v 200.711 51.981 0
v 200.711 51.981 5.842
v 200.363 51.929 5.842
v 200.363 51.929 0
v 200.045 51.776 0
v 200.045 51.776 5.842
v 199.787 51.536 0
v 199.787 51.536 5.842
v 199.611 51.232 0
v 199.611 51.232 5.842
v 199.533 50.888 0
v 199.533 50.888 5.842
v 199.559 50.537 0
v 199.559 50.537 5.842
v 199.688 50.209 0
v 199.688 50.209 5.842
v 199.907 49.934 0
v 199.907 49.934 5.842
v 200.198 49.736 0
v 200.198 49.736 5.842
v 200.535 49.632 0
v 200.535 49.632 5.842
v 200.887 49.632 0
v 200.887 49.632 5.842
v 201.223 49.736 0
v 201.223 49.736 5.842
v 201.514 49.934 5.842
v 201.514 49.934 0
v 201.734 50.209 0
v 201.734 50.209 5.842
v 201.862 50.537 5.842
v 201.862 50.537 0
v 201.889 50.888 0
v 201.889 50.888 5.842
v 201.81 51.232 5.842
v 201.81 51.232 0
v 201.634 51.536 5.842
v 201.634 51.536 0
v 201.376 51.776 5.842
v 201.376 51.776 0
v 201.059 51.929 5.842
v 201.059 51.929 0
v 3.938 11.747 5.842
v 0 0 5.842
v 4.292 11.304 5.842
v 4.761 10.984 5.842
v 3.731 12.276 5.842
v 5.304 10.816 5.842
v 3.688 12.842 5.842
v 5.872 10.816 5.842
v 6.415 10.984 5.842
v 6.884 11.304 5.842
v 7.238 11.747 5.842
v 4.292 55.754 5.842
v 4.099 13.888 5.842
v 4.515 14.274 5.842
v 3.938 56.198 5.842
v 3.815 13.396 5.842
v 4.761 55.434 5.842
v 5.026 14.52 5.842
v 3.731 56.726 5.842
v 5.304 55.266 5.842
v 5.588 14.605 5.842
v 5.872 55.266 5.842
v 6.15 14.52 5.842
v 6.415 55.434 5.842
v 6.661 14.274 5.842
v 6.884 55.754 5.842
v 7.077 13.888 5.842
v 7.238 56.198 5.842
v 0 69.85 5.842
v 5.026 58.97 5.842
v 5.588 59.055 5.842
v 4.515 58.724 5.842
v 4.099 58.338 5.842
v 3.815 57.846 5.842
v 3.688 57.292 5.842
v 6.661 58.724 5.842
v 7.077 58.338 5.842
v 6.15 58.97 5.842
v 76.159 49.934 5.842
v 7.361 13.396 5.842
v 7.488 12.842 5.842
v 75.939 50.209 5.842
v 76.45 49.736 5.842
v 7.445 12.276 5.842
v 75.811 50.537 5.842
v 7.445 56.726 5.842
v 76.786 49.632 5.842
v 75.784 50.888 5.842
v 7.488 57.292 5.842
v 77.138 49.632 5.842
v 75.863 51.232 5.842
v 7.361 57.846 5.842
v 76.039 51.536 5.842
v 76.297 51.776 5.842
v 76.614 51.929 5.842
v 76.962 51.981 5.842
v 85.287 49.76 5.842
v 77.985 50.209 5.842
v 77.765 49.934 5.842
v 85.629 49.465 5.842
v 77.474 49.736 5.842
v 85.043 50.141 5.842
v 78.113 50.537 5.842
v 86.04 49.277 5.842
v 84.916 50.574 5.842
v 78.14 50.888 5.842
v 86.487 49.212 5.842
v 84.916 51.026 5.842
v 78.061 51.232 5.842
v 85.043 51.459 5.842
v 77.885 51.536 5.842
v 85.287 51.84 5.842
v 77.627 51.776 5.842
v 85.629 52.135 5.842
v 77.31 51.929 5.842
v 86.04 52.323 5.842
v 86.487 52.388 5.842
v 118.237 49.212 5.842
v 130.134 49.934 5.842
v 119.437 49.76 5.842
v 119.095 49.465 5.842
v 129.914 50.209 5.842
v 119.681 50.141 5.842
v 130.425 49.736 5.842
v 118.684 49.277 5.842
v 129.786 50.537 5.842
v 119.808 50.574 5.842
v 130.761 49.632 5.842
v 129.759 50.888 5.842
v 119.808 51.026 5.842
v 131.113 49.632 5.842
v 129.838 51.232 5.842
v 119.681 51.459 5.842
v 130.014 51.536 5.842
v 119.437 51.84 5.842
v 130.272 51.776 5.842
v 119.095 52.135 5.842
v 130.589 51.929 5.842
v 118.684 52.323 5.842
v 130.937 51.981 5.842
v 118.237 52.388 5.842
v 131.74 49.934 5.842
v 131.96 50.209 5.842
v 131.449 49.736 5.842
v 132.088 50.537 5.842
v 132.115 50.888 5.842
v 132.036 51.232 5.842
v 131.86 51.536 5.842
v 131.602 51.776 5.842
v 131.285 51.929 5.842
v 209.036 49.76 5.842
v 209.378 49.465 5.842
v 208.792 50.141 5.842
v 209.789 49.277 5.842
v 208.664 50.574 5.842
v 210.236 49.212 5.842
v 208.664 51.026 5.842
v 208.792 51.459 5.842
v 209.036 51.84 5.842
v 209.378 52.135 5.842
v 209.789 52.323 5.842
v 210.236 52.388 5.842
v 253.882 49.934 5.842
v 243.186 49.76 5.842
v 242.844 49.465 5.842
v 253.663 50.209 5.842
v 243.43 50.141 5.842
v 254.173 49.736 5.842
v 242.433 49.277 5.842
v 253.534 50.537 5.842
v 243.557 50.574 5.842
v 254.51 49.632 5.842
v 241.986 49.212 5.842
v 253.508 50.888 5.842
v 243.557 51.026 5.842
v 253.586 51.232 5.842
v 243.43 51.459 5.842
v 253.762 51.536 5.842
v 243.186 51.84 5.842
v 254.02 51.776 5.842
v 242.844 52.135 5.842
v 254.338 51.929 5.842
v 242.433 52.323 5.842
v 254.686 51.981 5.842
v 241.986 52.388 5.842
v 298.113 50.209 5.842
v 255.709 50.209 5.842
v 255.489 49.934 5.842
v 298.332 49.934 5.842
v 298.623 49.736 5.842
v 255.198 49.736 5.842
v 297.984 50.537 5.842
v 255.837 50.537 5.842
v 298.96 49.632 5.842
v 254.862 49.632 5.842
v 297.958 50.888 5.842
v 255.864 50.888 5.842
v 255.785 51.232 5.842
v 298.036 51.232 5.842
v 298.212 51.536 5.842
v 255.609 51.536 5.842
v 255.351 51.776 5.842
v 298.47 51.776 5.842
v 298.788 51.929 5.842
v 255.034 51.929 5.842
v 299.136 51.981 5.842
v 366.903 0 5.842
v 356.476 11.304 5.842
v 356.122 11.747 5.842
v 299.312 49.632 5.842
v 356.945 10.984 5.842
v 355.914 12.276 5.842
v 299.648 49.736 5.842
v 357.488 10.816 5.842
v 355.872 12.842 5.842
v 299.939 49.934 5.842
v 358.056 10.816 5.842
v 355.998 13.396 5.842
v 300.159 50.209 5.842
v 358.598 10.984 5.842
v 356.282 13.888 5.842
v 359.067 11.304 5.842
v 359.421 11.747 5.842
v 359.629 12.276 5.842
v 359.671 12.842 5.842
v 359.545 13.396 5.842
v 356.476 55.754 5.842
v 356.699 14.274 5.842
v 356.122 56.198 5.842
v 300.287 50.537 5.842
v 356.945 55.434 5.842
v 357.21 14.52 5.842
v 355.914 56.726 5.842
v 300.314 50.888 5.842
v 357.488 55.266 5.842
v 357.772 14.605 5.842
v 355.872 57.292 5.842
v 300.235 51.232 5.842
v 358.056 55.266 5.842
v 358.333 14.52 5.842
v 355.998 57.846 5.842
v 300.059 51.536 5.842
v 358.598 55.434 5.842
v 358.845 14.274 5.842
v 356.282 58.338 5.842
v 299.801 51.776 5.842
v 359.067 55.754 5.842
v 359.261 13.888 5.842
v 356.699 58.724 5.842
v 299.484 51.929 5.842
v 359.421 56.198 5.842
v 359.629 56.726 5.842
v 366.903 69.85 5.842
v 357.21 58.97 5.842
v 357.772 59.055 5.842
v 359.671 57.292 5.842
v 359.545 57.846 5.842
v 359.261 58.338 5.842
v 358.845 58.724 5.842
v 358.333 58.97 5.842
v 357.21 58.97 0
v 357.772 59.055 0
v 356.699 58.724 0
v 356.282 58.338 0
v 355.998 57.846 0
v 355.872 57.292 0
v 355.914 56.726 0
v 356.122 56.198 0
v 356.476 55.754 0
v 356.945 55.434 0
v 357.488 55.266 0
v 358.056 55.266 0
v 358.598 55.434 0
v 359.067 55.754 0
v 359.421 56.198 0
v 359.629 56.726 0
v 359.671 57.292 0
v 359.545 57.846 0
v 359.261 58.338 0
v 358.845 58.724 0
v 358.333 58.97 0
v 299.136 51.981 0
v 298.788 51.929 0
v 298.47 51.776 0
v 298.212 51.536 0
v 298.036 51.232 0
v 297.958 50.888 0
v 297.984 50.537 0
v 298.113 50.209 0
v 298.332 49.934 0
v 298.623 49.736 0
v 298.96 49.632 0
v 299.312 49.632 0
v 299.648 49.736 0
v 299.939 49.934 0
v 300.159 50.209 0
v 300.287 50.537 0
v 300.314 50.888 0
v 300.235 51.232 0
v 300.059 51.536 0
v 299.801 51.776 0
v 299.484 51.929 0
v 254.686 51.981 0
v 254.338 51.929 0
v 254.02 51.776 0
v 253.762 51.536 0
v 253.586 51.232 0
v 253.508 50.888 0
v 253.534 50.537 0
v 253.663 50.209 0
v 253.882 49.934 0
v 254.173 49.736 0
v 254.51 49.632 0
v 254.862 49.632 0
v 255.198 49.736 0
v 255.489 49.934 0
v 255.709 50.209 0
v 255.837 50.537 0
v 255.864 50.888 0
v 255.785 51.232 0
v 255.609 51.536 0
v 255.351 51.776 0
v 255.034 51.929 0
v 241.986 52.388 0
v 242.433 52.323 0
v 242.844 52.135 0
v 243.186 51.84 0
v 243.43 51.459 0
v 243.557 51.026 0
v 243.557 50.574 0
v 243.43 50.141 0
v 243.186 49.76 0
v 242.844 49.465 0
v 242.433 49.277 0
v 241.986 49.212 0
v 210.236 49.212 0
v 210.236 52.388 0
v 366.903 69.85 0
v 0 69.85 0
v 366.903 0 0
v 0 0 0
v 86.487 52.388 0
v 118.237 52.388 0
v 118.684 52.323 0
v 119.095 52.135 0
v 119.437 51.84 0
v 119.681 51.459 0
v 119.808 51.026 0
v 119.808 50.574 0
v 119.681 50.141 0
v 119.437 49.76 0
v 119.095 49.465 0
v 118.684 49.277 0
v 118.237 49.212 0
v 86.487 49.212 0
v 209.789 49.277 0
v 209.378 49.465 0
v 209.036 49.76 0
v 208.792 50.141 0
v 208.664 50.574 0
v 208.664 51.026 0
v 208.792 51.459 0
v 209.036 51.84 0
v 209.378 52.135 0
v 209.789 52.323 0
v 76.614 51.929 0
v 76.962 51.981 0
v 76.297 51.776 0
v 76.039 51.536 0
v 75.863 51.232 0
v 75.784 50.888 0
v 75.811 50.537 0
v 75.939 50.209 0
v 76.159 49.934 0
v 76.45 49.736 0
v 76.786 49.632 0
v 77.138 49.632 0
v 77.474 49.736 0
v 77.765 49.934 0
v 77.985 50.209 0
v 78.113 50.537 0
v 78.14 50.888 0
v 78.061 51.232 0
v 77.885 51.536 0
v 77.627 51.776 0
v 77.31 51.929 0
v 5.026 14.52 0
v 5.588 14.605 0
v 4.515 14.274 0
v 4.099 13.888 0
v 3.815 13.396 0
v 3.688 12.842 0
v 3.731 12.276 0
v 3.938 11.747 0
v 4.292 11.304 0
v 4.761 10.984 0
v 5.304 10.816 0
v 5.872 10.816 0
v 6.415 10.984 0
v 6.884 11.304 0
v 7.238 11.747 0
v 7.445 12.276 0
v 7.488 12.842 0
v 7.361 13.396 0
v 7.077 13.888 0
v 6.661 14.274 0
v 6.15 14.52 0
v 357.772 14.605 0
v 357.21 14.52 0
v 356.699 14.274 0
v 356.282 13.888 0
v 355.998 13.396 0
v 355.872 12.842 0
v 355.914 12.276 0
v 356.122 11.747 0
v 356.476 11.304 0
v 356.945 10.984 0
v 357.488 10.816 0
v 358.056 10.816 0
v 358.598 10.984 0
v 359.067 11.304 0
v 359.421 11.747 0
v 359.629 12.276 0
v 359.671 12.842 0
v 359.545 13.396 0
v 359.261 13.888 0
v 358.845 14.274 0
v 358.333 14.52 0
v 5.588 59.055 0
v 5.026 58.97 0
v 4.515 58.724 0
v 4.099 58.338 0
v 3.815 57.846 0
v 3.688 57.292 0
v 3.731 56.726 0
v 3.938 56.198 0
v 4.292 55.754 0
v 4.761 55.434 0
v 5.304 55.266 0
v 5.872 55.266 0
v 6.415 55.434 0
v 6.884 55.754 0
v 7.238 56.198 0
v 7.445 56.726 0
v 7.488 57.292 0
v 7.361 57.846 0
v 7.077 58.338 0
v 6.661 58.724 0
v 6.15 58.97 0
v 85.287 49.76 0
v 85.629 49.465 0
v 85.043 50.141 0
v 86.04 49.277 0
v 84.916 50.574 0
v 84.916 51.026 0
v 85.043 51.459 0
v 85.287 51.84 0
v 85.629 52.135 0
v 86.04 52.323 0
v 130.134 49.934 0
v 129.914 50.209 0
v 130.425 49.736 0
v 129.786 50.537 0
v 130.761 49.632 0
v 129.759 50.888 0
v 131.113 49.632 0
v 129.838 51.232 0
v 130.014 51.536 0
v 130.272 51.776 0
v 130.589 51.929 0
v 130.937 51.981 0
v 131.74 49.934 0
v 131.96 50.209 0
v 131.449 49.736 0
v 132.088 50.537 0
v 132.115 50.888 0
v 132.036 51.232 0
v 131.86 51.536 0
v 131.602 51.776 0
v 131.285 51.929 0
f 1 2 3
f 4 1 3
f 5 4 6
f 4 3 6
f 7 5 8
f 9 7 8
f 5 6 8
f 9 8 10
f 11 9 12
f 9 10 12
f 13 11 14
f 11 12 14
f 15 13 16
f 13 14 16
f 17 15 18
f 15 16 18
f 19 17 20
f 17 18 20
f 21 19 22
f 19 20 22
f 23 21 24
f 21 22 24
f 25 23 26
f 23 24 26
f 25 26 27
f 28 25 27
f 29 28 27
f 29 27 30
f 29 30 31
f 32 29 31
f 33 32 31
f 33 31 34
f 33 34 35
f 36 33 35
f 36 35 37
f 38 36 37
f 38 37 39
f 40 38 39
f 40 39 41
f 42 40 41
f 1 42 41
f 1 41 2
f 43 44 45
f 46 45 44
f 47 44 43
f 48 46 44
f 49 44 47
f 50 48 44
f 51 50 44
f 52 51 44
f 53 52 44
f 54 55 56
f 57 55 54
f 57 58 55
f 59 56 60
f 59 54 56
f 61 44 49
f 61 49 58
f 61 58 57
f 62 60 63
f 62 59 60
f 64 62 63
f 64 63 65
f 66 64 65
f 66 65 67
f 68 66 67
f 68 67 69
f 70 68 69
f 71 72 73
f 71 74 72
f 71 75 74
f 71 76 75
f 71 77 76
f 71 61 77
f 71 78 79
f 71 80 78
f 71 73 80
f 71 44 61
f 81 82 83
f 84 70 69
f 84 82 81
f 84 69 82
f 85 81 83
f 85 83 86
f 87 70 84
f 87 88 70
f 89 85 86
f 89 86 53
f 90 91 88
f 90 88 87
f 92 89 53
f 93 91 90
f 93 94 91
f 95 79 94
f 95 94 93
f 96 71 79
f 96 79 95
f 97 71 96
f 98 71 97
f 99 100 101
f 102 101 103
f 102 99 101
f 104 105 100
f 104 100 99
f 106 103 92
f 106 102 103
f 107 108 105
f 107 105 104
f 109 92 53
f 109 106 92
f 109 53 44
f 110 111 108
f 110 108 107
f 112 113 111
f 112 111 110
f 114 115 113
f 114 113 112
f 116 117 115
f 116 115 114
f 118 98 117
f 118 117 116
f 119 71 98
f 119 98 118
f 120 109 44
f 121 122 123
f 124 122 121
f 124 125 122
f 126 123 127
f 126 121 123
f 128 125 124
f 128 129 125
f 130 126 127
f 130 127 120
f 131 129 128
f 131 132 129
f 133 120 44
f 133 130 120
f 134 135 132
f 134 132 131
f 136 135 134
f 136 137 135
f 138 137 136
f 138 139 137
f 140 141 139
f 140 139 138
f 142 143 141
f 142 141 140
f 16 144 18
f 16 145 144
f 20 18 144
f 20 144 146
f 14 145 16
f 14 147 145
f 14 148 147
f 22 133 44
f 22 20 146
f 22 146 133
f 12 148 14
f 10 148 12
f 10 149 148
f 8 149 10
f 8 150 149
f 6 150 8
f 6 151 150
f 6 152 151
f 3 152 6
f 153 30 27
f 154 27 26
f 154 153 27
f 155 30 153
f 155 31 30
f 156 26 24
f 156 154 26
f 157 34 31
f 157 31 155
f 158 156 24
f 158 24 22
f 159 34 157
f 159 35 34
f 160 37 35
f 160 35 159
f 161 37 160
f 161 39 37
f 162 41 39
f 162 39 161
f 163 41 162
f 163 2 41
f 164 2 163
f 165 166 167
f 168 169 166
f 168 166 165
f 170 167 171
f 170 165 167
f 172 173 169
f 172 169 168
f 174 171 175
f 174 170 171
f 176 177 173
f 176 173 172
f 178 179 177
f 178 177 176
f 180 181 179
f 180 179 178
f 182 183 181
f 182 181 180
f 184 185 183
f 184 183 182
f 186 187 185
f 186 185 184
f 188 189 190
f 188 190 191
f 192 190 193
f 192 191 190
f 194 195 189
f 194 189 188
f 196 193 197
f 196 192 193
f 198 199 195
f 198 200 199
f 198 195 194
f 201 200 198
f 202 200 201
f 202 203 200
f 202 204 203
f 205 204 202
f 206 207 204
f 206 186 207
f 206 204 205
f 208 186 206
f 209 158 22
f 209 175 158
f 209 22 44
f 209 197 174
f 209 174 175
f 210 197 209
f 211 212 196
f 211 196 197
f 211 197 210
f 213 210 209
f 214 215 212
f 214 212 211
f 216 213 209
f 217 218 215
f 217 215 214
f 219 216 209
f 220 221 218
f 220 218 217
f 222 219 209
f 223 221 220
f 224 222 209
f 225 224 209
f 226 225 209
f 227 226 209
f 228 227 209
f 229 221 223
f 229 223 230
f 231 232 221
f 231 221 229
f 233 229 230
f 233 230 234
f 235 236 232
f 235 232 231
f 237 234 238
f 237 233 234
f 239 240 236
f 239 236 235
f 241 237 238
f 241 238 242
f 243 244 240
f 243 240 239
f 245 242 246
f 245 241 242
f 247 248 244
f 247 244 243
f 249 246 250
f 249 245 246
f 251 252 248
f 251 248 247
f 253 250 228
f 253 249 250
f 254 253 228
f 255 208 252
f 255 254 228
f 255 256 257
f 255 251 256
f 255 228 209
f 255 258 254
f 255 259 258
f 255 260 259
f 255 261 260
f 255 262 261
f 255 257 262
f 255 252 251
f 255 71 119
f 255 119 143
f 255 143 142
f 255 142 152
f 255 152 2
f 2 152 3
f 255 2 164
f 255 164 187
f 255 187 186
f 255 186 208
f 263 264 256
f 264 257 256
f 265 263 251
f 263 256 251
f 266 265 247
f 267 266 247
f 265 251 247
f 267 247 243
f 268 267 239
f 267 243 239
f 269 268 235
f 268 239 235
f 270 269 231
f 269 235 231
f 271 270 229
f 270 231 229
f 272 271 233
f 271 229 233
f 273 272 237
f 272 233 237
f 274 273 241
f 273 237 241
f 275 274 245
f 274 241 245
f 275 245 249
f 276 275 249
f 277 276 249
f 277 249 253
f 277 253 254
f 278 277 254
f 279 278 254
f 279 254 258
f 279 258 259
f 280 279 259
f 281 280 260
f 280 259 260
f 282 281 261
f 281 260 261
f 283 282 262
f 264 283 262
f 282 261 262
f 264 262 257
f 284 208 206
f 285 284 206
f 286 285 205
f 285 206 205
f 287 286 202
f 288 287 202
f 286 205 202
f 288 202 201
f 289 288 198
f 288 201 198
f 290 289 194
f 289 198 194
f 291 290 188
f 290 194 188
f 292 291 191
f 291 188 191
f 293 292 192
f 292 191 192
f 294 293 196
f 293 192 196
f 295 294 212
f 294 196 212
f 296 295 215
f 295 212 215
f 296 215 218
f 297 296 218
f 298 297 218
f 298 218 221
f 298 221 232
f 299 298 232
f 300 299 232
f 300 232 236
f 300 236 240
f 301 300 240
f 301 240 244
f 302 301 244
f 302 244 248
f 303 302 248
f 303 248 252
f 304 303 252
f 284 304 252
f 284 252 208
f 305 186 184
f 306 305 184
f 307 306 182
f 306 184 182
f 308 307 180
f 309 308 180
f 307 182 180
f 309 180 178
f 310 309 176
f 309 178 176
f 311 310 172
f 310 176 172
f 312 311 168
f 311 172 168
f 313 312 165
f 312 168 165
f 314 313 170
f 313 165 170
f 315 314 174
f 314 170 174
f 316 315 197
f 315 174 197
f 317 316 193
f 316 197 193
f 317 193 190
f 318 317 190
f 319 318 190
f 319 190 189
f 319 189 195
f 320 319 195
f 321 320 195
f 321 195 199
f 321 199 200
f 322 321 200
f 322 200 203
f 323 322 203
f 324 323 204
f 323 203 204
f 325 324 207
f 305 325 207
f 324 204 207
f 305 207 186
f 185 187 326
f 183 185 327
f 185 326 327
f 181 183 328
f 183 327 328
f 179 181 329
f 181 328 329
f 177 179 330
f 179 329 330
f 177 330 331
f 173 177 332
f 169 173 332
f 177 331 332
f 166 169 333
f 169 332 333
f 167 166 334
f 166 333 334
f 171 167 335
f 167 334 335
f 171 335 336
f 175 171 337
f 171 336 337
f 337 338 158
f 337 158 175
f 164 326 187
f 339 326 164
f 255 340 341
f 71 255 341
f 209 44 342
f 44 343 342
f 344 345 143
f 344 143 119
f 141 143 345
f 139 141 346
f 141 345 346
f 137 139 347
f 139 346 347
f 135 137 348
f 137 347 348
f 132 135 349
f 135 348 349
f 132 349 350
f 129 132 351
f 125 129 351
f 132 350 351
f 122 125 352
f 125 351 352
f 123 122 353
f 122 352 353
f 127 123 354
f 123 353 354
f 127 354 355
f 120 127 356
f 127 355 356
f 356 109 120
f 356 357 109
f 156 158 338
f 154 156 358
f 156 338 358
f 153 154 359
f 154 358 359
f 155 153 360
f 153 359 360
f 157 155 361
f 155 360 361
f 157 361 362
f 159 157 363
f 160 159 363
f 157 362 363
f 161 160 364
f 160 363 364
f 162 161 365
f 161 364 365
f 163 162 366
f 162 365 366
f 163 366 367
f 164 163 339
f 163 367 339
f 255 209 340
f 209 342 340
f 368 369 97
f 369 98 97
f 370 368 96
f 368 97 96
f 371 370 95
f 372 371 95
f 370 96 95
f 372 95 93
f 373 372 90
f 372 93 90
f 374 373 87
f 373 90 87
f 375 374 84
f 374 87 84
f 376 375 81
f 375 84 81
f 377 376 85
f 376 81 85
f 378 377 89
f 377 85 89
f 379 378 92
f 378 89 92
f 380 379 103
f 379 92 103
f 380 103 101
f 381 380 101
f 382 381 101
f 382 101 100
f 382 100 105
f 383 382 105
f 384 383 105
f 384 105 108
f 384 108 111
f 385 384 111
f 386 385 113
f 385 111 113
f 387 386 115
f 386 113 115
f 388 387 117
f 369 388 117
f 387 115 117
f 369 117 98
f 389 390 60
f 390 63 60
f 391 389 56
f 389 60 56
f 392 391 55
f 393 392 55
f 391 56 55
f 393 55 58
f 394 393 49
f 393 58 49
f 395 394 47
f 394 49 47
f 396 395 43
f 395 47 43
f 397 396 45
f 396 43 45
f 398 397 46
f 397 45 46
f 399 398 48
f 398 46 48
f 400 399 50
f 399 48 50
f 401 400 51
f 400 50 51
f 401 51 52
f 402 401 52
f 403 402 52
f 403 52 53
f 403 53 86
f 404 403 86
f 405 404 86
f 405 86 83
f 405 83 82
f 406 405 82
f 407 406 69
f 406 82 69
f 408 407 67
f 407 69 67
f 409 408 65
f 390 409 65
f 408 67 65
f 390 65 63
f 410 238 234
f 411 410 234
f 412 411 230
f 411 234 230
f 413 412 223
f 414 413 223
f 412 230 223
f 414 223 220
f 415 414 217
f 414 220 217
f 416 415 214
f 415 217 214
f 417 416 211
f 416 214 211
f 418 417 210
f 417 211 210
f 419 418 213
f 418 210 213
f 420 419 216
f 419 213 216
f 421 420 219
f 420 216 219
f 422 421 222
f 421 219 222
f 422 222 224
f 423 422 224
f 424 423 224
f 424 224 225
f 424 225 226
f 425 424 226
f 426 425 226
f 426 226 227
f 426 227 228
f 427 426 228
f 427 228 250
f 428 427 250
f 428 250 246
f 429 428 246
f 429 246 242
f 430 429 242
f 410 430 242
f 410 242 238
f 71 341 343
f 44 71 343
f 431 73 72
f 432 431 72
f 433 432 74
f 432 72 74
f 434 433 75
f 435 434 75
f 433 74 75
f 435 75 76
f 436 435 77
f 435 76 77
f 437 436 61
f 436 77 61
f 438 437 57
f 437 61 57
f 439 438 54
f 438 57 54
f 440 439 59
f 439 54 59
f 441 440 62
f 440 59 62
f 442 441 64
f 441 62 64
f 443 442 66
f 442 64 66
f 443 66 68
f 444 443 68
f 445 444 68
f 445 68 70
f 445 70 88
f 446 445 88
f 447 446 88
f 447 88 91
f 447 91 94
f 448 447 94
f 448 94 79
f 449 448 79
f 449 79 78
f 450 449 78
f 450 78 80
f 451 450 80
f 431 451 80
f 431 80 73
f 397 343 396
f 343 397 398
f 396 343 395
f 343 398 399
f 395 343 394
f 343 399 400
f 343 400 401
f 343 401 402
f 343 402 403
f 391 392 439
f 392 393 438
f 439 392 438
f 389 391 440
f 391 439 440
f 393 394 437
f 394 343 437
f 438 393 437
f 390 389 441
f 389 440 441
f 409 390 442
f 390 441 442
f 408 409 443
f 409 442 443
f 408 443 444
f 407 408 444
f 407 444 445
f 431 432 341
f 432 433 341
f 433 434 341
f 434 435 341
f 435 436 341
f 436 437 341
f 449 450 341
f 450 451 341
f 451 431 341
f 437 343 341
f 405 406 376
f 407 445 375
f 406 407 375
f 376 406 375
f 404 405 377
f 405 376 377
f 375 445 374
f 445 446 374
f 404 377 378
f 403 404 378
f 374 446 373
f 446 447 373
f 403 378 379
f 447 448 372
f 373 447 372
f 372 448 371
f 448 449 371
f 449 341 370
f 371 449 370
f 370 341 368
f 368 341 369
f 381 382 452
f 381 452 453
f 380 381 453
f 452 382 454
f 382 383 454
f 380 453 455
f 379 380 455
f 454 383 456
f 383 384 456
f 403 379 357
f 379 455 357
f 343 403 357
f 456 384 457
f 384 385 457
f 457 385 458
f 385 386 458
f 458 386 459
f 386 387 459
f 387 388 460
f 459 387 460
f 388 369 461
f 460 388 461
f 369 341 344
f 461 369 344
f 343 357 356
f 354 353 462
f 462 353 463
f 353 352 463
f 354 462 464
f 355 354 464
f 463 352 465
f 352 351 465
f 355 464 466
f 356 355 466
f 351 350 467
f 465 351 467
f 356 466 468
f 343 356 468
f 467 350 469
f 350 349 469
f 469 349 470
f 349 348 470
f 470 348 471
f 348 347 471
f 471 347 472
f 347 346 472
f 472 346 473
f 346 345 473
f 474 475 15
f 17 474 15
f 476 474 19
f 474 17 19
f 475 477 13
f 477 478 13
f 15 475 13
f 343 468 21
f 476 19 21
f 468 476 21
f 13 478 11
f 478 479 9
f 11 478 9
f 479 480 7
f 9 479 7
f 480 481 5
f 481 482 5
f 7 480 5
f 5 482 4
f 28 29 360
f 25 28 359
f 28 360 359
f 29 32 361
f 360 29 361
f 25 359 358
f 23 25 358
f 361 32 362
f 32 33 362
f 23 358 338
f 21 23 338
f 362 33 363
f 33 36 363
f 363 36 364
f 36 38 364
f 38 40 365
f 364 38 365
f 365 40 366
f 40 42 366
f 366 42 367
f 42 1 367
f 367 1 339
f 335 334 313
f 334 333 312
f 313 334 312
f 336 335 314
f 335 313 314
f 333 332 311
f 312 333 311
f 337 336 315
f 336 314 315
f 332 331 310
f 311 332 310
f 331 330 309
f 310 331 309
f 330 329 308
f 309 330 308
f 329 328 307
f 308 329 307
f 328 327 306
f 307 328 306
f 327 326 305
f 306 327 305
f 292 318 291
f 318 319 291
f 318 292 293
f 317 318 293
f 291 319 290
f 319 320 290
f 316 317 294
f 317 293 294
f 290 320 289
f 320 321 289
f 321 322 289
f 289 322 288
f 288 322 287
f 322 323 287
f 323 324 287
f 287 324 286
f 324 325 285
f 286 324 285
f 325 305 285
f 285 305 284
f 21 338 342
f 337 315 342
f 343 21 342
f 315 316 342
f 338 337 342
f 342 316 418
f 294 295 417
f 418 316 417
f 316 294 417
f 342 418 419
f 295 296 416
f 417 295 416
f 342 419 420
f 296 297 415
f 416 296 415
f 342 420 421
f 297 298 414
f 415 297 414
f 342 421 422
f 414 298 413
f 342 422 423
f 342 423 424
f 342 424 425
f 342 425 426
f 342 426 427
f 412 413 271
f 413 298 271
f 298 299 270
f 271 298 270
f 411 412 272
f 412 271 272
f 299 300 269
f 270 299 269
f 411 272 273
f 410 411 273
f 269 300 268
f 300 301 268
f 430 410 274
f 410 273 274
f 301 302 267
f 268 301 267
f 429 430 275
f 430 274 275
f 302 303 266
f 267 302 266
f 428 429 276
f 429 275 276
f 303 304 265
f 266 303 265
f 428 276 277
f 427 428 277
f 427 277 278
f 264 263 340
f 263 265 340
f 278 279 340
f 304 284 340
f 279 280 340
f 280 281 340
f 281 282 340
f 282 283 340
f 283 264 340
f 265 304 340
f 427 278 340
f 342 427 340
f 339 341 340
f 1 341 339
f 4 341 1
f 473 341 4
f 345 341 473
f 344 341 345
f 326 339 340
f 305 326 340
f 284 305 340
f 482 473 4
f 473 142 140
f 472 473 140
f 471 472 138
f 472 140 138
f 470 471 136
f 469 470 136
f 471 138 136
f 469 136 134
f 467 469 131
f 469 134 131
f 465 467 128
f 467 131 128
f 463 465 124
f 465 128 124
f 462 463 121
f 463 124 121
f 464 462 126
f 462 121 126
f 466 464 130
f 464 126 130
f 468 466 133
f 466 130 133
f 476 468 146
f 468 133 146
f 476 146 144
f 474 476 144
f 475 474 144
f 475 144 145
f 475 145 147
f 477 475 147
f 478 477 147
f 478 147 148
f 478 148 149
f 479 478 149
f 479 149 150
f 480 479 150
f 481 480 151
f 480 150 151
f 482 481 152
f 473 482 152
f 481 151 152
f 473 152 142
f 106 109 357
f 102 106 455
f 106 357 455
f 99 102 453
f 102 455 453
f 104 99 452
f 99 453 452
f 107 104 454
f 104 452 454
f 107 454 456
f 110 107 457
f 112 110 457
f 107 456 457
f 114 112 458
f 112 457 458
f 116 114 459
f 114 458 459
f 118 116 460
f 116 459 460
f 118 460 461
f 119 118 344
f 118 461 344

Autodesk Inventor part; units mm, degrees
ref_plane "YZ Plane" through (0, 0, 0) normal (1, 0, 0) x (0, 1, 0)
ref_plane "XZ Plane" through (0, 0, 0) normal (0, 1, 0) x (-1, 0, 0)
sketch "Sketch1" plane through (0, 0, 0) normal (0, 0, 1) x (1, 0, 0)
  line L0 (0, 83.82) -> (0, -13.97) projected
  line L1 (-73.3806, 0) -> (440.2836, 0) projected
  line L2 (0, 0) -> (366.903, 0)
  line L3 (366.903, 0) -> (366.903, 69.85)
  line L4 (366.903, 69.85) -> (0, 69.85)
  line L5 (0, 69.85) -> (0, 0)
  line L6 (0, 34.925) -> (366.903, 34.925) construction
  line L7 (241.9858, 50.8) -> (210.2358, 50.8) construction
  line L8 (241.9858, 52.3875) -> (210.2358, 52.3875)
  line L9 (210.2358, 49.2125) -> (241.9858, 49.2125)
  arc A0 (241.9858, 49.2125) -> (241.9858, 52.3875) centre (241.9858, 50.8) ccw
  arc A1 (210.2358, 52.3875) -> (210.2358, 49.2125) centre (210.2358, 50.8) ccw
  line L10 (118.237, 50.8) -> (86.487, 50.8) construction
  line L11 (118.237, 52.3875) -> (86.487, 52.3875)
  line L12 (86.487, 49.2125) -> (118.237, 49.2125)
  arc A2 (118.237, 49.2125) -> (118.237, 52.3875) centre (118.237, 50.8) ccw
  arc A3 (86.487, 52.3875) -> (86.487, 49.2125) centre (86.487, 50.8) ccw
  line L13 (102.362, 50.8) -> (366.903, 50.8) construction
  point P0 (5.588, 12.7)
  point P1 (5.588, 57.15)
  point P2 (357.7717, 57.15)
  point P3 (357.7717, 12.7)
  point P4 (226.1108, 50.8)
  point P5 (226.1108, 50.8)
  point P6 (130.937, 50.8)
  point P7 (299.1358, 50.8)
  point P8 (254.6858, 50.8)
  point P9 (175.387, 50.8)
  point P10 (76.962, 50.8)
  point P11 (200.7108, 50.8)
  dimension "d0" = 366.903
  dimension "d1" = 69.85
  dimension "d9" = 9.1313
  dimension "d10" = 22.225
  dimension "d11" = 22.225
  dimension "d29" = 5.588
  dimension "d30" = 3.175
  dimension "d31" = 31.75
  dimension "d32" = 140.7922
  dimension "d33" = 19.05
  dimension "d36" = 3.175
  dimension "d37" = 31.75
  dimension "d38" = 264.541
  dimension "d41" = 44.45
  dimension "d42" = 19.05
  dimension "d43" = 44.45
  dimension "d45" = 28.575
  dimension "d46" = 28.575
  dimension "d54" = 25.4
  dimension "d55" = 25.4
extrude "Extrusion1" add sketch "Sketch1" along normal blind 5.842 contours L4 L3 L1 L0 | A0 L9 A1 L8 | A2 L12 A3 L11
hole "Hole1" at (357.7717, 57.15, 0) at (357.7717, 12.7, 0) direction (0, 0, 1) diameter 3.81 end through all
hole "Hole2" at (5.588, 12.7, 0) at (5.588, 57.15, 0) direction (0, 0, 1) diameter 3.81 end through all
extrude "Extrusion2" cut sketch "Sketch1" along normal up to next contours A0 L9 A1 L8 | A2 L12 A3 L11
hole "Hole3" at (130.937, 50.8, 0) at (299.1358, 50.8, 0) at (254.6858, 50.8, 0) at (76.962, 50.8, 0) at (200.7108, 50.8, 0) direction (0, 0, 1) diameter 2.3622 end through all
equation "\"d36\" = d30"
equation "\"d37\" = d31"
